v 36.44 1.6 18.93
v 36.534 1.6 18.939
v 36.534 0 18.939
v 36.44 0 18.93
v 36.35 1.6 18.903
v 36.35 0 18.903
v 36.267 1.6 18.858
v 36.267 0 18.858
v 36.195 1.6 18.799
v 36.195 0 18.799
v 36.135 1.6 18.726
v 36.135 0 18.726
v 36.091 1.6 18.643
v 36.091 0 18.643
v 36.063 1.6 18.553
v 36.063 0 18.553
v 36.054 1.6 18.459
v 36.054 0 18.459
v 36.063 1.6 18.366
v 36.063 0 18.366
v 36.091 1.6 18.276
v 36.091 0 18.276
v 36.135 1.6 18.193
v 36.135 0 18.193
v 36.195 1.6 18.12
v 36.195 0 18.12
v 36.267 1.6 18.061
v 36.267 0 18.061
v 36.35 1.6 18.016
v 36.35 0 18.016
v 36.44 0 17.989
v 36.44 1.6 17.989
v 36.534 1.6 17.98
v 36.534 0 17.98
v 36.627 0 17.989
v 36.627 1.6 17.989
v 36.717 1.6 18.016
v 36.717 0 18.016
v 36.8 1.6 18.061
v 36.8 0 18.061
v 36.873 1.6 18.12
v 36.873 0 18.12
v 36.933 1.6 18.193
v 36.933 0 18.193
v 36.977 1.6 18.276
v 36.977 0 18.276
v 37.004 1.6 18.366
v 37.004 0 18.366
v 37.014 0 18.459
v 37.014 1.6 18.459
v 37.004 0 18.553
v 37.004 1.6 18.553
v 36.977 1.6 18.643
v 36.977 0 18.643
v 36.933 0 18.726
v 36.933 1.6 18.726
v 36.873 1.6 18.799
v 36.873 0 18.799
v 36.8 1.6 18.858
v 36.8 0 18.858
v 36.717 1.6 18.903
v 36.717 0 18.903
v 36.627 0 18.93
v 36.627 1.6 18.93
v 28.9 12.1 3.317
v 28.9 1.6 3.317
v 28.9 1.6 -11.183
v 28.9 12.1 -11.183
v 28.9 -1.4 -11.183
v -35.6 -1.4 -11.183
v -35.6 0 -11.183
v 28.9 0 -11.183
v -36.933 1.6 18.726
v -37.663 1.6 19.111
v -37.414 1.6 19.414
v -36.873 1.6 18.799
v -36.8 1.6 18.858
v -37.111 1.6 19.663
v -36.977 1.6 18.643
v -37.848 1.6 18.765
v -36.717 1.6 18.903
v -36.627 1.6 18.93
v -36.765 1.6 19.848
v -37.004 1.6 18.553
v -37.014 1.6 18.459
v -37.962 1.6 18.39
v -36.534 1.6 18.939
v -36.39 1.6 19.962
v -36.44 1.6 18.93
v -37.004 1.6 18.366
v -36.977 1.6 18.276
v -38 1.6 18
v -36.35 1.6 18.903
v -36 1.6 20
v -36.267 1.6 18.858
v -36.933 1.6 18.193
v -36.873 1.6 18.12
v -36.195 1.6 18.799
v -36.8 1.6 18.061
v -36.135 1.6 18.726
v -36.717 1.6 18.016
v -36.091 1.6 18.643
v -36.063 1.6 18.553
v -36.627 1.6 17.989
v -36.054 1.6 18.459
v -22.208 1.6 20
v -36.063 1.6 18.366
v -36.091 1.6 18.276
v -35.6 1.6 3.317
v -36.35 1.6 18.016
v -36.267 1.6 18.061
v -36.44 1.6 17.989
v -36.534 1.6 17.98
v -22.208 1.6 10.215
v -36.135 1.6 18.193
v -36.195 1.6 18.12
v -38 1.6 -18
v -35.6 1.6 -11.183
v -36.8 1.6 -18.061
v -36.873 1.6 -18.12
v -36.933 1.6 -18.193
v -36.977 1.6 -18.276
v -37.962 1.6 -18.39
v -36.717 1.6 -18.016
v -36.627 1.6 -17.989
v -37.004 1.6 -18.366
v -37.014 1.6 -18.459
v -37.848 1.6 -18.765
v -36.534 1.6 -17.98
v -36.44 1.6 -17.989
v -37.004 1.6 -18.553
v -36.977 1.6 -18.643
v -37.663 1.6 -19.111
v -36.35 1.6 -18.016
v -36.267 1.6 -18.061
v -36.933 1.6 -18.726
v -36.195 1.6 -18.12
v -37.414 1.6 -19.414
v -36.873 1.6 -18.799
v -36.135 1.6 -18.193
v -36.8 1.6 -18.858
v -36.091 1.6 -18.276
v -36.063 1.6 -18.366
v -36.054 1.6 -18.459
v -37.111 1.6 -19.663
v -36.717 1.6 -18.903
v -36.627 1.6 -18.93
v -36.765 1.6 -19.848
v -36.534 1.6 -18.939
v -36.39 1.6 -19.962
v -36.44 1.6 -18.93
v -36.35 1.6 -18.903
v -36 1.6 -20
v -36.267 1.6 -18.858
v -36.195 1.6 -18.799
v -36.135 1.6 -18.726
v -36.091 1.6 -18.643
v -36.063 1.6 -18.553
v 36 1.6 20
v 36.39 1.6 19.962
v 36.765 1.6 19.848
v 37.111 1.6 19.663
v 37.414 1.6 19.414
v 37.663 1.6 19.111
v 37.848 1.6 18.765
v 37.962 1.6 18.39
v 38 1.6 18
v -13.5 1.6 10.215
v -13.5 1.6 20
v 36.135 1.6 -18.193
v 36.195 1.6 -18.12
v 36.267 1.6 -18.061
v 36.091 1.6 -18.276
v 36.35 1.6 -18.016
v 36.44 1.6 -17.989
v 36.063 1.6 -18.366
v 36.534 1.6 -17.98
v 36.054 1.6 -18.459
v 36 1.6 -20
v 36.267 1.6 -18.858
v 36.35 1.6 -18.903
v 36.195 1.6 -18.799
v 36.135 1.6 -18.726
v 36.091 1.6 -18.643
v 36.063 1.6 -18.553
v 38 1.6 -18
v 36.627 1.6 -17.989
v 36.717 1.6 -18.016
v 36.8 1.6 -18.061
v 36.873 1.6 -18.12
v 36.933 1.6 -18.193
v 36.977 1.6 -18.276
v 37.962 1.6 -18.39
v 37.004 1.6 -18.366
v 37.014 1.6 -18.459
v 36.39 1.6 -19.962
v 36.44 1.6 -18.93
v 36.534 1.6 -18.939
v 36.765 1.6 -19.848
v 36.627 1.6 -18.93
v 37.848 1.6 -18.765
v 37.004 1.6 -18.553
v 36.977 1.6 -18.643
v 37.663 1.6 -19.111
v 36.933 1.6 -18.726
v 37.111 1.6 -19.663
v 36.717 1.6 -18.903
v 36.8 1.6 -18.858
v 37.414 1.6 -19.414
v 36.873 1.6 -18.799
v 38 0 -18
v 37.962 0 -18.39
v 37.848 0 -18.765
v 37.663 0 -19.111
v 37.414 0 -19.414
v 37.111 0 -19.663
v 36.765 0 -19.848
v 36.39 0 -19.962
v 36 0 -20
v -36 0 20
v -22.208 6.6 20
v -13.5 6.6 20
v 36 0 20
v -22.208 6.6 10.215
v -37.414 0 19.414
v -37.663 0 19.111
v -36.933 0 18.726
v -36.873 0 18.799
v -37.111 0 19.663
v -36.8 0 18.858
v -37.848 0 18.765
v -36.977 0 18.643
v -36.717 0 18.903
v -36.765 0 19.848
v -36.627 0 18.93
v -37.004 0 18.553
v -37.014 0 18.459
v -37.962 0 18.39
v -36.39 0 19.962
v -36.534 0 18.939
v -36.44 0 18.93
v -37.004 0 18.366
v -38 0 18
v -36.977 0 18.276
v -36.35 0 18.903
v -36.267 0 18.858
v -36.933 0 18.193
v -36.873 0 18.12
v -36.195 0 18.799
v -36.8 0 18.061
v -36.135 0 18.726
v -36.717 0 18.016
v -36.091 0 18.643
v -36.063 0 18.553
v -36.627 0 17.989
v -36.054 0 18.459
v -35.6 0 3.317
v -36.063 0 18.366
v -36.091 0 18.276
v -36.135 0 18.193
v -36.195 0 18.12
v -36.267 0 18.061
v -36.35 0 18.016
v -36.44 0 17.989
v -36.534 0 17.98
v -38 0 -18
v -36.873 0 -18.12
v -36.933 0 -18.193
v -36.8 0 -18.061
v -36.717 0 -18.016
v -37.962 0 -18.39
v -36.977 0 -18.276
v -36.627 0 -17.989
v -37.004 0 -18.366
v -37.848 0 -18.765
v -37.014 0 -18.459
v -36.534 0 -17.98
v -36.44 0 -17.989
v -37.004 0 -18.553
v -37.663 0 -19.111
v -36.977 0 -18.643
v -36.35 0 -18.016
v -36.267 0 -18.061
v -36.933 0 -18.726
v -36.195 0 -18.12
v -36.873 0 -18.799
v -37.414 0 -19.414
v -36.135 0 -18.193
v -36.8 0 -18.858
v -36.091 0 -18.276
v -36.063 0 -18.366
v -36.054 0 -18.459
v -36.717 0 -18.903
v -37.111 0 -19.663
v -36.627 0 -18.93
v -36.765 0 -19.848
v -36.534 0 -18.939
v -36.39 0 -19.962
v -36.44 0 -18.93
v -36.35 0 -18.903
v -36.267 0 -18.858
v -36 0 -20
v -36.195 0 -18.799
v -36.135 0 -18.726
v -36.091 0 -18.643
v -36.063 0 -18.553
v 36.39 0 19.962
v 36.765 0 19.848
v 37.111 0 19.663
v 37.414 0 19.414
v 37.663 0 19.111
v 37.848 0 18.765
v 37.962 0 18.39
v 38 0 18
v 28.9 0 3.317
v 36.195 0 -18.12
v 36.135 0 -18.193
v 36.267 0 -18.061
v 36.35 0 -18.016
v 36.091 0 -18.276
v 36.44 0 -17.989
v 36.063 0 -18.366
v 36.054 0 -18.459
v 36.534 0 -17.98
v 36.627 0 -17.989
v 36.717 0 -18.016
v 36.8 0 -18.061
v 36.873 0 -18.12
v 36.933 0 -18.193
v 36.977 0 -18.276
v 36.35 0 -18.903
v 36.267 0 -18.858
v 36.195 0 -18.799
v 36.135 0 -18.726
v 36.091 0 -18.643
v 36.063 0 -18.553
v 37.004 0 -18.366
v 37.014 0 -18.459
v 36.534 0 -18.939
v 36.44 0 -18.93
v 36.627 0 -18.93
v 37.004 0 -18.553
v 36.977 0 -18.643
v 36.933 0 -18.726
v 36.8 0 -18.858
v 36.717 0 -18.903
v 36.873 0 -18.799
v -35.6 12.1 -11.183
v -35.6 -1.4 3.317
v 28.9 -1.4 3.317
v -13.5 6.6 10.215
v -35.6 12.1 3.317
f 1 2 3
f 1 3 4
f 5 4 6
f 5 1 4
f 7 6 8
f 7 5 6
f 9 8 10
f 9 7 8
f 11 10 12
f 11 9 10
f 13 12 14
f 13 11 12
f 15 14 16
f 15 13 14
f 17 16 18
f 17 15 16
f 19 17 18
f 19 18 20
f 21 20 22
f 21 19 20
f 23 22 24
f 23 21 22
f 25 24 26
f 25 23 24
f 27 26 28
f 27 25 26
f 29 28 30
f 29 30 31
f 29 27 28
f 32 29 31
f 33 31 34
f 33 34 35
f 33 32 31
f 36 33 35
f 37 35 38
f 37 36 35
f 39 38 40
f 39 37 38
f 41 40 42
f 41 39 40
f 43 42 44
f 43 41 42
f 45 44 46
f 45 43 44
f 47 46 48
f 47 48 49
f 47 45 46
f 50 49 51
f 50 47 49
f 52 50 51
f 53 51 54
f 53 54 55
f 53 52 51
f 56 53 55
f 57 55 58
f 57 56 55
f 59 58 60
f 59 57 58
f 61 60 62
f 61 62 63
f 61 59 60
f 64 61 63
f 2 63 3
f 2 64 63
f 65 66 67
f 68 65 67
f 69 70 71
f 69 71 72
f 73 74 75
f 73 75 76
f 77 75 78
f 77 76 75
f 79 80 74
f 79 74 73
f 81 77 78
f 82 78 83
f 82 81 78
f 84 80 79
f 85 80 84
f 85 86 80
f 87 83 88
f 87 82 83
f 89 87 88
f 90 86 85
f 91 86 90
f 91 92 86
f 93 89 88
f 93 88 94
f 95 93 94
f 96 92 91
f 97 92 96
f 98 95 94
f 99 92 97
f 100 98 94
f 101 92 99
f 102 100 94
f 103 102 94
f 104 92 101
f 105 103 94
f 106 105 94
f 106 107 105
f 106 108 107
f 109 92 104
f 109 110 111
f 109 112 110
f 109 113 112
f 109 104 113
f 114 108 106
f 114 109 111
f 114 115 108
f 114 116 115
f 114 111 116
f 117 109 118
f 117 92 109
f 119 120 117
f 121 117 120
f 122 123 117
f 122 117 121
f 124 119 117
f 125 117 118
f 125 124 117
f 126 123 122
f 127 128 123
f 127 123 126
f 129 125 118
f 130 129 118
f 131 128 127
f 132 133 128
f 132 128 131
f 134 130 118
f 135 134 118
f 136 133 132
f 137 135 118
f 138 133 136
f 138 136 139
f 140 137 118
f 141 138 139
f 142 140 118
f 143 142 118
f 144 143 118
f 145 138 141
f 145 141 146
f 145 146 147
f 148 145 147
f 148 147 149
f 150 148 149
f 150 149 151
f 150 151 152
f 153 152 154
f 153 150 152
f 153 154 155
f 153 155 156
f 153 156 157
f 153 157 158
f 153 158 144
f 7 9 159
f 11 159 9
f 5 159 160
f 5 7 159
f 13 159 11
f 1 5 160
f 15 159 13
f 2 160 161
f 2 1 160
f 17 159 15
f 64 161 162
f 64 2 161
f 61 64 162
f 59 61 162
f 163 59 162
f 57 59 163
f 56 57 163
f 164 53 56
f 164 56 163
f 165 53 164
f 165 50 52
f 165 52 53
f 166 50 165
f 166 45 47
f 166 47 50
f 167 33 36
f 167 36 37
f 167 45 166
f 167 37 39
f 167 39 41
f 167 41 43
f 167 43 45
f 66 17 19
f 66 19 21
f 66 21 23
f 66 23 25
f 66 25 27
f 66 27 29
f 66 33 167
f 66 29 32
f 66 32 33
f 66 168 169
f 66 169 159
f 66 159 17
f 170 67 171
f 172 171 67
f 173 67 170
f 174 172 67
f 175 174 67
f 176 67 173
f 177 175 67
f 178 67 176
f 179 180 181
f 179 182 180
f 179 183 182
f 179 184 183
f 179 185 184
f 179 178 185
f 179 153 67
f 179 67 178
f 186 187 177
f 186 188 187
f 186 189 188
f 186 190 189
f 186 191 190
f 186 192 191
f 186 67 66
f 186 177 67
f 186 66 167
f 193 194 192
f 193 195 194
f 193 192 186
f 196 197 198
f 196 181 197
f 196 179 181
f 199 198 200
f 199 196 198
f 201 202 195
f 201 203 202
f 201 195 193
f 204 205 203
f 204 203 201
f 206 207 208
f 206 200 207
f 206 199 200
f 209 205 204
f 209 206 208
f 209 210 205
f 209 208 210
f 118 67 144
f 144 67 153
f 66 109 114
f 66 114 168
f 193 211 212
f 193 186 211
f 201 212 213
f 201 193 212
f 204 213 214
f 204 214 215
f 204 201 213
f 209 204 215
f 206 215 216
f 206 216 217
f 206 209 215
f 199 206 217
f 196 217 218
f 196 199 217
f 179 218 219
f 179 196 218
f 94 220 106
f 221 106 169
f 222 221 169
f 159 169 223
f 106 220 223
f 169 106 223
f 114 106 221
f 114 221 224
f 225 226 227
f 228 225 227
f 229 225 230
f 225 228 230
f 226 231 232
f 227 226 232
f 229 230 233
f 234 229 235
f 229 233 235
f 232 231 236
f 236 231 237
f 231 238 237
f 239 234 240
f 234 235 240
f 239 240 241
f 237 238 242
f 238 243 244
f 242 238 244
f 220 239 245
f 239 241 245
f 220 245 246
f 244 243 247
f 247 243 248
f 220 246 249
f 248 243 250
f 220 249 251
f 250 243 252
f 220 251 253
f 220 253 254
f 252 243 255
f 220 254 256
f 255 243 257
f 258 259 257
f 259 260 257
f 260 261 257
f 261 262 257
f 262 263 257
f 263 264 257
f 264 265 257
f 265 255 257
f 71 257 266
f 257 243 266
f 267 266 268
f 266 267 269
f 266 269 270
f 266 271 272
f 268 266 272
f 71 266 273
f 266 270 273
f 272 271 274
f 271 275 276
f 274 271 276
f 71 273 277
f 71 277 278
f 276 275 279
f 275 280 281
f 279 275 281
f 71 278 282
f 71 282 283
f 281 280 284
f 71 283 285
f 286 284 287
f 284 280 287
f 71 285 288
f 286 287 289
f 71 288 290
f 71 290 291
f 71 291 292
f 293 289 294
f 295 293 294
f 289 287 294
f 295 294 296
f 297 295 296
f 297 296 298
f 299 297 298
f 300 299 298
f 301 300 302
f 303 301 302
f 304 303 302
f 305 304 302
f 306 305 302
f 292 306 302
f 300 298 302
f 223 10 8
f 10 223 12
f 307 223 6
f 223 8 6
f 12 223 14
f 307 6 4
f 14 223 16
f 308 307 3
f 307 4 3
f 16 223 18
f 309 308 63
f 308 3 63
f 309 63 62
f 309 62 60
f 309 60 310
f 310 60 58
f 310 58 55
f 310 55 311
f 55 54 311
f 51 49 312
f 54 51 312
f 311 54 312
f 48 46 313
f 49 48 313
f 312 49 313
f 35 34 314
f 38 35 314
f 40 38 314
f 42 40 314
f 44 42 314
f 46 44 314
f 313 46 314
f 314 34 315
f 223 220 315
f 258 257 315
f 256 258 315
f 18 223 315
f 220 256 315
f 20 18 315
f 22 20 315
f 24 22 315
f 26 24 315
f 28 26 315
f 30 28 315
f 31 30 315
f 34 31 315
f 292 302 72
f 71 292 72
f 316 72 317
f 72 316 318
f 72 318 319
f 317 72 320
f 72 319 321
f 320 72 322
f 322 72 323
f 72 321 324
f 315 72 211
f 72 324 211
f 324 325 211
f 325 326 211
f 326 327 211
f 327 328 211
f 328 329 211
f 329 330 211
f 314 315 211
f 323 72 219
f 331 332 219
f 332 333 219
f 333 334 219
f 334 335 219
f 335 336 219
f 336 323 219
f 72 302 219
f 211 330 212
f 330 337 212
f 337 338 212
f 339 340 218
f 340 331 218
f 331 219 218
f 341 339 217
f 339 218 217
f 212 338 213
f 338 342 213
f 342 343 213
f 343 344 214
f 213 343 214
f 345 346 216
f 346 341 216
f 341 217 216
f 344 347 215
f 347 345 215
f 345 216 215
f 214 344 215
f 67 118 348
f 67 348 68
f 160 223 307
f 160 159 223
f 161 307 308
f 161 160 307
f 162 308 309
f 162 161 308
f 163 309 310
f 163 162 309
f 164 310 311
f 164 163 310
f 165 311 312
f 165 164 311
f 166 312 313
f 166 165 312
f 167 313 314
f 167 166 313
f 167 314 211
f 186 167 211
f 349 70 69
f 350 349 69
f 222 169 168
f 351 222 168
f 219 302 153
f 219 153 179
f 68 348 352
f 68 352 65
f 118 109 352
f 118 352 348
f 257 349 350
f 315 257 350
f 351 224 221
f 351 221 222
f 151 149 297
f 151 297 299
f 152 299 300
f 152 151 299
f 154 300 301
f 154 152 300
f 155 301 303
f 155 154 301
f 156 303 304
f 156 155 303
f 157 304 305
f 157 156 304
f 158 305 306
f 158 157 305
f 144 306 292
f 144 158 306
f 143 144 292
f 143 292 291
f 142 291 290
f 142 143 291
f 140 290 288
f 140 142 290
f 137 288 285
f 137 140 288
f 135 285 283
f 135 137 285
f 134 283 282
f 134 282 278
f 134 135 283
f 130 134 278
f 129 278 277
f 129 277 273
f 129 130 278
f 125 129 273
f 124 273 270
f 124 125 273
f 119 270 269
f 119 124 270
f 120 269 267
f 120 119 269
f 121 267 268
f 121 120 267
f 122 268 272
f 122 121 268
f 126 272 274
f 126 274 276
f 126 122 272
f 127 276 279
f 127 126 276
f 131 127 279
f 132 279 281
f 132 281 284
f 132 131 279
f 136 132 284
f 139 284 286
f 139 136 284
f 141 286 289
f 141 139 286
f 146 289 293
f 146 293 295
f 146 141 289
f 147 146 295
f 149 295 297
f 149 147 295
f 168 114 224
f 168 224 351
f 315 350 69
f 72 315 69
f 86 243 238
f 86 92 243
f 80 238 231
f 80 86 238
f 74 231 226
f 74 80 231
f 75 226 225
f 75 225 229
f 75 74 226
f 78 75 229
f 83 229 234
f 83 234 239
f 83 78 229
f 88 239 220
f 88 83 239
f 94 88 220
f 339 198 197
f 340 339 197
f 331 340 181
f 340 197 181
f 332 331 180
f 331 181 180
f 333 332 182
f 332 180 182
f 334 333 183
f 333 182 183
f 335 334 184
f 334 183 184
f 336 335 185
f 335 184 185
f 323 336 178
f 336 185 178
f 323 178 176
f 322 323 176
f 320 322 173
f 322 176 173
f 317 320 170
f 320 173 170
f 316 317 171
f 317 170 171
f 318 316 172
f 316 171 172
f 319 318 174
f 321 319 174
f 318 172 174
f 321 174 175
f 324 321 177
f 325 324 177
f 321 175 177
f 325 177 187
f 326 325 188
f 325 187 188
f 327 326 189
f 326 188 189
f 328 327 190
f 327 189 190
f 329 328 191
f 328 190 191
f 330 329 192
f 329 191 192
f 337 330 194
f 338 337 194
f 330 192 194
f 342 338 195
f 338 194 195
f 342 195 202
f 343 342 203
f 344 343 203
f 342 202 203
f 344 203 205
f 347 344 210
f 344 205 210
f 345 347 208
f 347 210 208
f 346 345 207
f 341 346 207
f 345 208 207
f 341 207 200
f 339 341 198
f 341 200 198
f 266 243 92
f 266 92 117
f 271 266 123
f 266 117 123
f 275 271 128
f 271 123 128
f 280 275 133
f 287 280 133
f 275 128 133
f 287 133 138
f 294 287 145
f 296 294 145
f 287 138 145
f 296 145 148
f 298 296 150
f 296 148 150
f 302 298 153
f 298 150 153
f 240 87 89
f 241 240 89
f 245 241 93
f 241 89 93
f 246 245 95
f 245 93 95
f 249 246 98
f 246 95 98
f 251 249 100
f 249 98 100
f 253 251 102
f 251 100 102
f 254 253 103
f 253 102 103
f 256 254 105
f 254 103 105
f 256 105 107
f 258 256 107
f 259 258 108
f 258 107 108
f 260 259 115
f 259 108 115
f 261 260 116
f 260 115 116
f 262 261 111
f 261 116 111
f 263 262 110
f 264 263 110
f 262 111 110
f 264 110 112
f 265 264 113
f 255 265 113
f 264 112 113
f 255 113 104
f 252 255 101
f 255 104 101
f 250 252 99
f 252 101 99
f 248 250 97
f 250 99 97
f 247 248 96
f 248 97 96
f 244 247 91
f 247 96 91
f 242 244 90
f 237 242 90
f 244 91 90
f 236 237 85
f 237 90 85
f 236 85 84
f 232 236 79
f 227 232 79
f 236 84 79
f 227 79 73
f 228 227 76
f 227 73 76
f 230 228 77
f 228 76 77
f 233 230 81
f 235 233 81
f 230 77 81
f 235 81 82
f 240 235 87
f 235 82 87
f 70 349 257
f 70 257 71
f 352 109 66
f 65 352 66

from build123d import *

# Parameters (mm, degrees)
ESQUISSE1_W                                = 76
ESQUISSE1_H                                = 40
BOSS_EXTRU_1_DEPTH                         = 1.6
CONG_1_R                                   = 2
ESQUISSE2_R                                = 0.479748543
ENL_V_MAT_EXTRU_1_DEPTH                    = 1.6
SYM_TRIE1_AT_THE_SECOND_PLANE_COPY_1_SKE_R = 0.479748543
SYM_TRIE1_AT_THE_SECOND_PLANE_COPY_1_DEPTH = 1.6
BOSS_EXTRU_2_DEPTH                         = 10.5
BOSS_EXTRU_2_DEPTH_BACK                    = 3
ESQUISSE3_W                                = 64.5
ESQUISSE3_H                                = 14.5
ESQUISSE4_W                                = 8.707519808
ESQUISSE4_H                                = 9.784752996
BOSS_EXTRU_3_DEPTH                         = 5


with BuildPart() as part:
    # Esquisse1 → Boss.-Extru.1 (new body)
    with BuildSketch(Plane(origin=(0, 0, 0), x_dir=(1, 0, 0), z_dir=(0, 1, 0))):
        Rectangle(ESQUISSE1_W, ESQUISSE1_H)
    extrude(amount=BOSS_EXTRU_1_DEPTH)

    # Congé1
    cong_1_edges = [part.edges().sort_by_distance(p)[0] for p in [
        (38, 0.8, 20),
        (-38, 0.8, 20),
        (-38, 0.8, -20),
        (38, 0.8, -20),
    ]]
    fillet(cong_1_edges, radius=CONG_1_R)

    # Esquisse2 → Enlèv. mat.-Extru.1 (cut)
    with BuildSketch(Plane(origin=(0, 1.6, 0), x_dir=(1, 0, 0), z_dir=(0, 1, 0))):
        with Locations(Location((-36.533901181, -18.459426324, 0), (0, 0, 270))):
            Circle(ESQUISSE2_R)
    enl_v_mat_extru_1 = extrude(amount=-ENL_V_MAT_EXTRU_1_DEPTH, mode=Mode.SUBTRACT)

    # Symétrie1: Enlèv. mat.-Extru.1 across plane
    add(enl_v_mat_extru_1.mirror(Plane(origin=(0, 0, 0), x_dir=(0, 0, 1), z_dir=(1, 0, 0))), mode=Mode.SUBTRACT)

    # Symétrie1 at the second plane: Enlèv. mat.-Extru.1 across plane
    add(enl_v_mat_extru_1.mirror(Plane.XY), mode=Mode.SUBTRACT)

    # Symétrie1 at the second plane copy 1 ske → Symétrie1 at the second plane copy 1 (cut)
    with BuildSketch(Plane(origin=(0, 1.6, 0), x_dir=(-1, 0, 0), z_dir=(0, 1, 0))):
        with Locations(Location((-36.533901181, -18.459426324, 0), (0, 0, 270))):
            Circle(SYM_TRIE1_AT_THE_SECOND_PLANE_COPY_1_SKE_R)
    extrude(amount=-SYM_TRIE1_AT_THE_SECOND_PLANE_COPY_1_DEPTH, mode=Mode.SUBTRACT)

    # Esquisse3 → Boss.-Extru.2 (add, two sides: drawn at the far end of the back side and taken through both)
    with BuildSketch(Plane(origin=(0, 1.6, 0), x_dir=(1, 0, 0), z_dir=(0, 1, 0)).offset(-BOSS_EXTRU_2_DEPTH_BACK)):
        with Locations((-3.35, 3.932898171)):
            Rectangle(ESQUISSE3_W, ESQUISSE3_H)
    extrude(amount=BOSS_EXTRU_2_DEPTH + BOSS_EXTRU_2_DEPTH_BACK)

    # Esquisse4 → Boss.-Extru.3 (add)
    with BuildSketch(Plane(origin=(0, 1.6, 0), x_dir=(1, 0, 0), z_dir=(0, 1, 0))):
        with Locations((-17.853759904, -15.107623502)):
            Rectangle(ESQUISSE4_W, ESQUISSE4_H)
    extrude(amount=BOSS_EXTRU_3_DEPTH)


solid = part.part
